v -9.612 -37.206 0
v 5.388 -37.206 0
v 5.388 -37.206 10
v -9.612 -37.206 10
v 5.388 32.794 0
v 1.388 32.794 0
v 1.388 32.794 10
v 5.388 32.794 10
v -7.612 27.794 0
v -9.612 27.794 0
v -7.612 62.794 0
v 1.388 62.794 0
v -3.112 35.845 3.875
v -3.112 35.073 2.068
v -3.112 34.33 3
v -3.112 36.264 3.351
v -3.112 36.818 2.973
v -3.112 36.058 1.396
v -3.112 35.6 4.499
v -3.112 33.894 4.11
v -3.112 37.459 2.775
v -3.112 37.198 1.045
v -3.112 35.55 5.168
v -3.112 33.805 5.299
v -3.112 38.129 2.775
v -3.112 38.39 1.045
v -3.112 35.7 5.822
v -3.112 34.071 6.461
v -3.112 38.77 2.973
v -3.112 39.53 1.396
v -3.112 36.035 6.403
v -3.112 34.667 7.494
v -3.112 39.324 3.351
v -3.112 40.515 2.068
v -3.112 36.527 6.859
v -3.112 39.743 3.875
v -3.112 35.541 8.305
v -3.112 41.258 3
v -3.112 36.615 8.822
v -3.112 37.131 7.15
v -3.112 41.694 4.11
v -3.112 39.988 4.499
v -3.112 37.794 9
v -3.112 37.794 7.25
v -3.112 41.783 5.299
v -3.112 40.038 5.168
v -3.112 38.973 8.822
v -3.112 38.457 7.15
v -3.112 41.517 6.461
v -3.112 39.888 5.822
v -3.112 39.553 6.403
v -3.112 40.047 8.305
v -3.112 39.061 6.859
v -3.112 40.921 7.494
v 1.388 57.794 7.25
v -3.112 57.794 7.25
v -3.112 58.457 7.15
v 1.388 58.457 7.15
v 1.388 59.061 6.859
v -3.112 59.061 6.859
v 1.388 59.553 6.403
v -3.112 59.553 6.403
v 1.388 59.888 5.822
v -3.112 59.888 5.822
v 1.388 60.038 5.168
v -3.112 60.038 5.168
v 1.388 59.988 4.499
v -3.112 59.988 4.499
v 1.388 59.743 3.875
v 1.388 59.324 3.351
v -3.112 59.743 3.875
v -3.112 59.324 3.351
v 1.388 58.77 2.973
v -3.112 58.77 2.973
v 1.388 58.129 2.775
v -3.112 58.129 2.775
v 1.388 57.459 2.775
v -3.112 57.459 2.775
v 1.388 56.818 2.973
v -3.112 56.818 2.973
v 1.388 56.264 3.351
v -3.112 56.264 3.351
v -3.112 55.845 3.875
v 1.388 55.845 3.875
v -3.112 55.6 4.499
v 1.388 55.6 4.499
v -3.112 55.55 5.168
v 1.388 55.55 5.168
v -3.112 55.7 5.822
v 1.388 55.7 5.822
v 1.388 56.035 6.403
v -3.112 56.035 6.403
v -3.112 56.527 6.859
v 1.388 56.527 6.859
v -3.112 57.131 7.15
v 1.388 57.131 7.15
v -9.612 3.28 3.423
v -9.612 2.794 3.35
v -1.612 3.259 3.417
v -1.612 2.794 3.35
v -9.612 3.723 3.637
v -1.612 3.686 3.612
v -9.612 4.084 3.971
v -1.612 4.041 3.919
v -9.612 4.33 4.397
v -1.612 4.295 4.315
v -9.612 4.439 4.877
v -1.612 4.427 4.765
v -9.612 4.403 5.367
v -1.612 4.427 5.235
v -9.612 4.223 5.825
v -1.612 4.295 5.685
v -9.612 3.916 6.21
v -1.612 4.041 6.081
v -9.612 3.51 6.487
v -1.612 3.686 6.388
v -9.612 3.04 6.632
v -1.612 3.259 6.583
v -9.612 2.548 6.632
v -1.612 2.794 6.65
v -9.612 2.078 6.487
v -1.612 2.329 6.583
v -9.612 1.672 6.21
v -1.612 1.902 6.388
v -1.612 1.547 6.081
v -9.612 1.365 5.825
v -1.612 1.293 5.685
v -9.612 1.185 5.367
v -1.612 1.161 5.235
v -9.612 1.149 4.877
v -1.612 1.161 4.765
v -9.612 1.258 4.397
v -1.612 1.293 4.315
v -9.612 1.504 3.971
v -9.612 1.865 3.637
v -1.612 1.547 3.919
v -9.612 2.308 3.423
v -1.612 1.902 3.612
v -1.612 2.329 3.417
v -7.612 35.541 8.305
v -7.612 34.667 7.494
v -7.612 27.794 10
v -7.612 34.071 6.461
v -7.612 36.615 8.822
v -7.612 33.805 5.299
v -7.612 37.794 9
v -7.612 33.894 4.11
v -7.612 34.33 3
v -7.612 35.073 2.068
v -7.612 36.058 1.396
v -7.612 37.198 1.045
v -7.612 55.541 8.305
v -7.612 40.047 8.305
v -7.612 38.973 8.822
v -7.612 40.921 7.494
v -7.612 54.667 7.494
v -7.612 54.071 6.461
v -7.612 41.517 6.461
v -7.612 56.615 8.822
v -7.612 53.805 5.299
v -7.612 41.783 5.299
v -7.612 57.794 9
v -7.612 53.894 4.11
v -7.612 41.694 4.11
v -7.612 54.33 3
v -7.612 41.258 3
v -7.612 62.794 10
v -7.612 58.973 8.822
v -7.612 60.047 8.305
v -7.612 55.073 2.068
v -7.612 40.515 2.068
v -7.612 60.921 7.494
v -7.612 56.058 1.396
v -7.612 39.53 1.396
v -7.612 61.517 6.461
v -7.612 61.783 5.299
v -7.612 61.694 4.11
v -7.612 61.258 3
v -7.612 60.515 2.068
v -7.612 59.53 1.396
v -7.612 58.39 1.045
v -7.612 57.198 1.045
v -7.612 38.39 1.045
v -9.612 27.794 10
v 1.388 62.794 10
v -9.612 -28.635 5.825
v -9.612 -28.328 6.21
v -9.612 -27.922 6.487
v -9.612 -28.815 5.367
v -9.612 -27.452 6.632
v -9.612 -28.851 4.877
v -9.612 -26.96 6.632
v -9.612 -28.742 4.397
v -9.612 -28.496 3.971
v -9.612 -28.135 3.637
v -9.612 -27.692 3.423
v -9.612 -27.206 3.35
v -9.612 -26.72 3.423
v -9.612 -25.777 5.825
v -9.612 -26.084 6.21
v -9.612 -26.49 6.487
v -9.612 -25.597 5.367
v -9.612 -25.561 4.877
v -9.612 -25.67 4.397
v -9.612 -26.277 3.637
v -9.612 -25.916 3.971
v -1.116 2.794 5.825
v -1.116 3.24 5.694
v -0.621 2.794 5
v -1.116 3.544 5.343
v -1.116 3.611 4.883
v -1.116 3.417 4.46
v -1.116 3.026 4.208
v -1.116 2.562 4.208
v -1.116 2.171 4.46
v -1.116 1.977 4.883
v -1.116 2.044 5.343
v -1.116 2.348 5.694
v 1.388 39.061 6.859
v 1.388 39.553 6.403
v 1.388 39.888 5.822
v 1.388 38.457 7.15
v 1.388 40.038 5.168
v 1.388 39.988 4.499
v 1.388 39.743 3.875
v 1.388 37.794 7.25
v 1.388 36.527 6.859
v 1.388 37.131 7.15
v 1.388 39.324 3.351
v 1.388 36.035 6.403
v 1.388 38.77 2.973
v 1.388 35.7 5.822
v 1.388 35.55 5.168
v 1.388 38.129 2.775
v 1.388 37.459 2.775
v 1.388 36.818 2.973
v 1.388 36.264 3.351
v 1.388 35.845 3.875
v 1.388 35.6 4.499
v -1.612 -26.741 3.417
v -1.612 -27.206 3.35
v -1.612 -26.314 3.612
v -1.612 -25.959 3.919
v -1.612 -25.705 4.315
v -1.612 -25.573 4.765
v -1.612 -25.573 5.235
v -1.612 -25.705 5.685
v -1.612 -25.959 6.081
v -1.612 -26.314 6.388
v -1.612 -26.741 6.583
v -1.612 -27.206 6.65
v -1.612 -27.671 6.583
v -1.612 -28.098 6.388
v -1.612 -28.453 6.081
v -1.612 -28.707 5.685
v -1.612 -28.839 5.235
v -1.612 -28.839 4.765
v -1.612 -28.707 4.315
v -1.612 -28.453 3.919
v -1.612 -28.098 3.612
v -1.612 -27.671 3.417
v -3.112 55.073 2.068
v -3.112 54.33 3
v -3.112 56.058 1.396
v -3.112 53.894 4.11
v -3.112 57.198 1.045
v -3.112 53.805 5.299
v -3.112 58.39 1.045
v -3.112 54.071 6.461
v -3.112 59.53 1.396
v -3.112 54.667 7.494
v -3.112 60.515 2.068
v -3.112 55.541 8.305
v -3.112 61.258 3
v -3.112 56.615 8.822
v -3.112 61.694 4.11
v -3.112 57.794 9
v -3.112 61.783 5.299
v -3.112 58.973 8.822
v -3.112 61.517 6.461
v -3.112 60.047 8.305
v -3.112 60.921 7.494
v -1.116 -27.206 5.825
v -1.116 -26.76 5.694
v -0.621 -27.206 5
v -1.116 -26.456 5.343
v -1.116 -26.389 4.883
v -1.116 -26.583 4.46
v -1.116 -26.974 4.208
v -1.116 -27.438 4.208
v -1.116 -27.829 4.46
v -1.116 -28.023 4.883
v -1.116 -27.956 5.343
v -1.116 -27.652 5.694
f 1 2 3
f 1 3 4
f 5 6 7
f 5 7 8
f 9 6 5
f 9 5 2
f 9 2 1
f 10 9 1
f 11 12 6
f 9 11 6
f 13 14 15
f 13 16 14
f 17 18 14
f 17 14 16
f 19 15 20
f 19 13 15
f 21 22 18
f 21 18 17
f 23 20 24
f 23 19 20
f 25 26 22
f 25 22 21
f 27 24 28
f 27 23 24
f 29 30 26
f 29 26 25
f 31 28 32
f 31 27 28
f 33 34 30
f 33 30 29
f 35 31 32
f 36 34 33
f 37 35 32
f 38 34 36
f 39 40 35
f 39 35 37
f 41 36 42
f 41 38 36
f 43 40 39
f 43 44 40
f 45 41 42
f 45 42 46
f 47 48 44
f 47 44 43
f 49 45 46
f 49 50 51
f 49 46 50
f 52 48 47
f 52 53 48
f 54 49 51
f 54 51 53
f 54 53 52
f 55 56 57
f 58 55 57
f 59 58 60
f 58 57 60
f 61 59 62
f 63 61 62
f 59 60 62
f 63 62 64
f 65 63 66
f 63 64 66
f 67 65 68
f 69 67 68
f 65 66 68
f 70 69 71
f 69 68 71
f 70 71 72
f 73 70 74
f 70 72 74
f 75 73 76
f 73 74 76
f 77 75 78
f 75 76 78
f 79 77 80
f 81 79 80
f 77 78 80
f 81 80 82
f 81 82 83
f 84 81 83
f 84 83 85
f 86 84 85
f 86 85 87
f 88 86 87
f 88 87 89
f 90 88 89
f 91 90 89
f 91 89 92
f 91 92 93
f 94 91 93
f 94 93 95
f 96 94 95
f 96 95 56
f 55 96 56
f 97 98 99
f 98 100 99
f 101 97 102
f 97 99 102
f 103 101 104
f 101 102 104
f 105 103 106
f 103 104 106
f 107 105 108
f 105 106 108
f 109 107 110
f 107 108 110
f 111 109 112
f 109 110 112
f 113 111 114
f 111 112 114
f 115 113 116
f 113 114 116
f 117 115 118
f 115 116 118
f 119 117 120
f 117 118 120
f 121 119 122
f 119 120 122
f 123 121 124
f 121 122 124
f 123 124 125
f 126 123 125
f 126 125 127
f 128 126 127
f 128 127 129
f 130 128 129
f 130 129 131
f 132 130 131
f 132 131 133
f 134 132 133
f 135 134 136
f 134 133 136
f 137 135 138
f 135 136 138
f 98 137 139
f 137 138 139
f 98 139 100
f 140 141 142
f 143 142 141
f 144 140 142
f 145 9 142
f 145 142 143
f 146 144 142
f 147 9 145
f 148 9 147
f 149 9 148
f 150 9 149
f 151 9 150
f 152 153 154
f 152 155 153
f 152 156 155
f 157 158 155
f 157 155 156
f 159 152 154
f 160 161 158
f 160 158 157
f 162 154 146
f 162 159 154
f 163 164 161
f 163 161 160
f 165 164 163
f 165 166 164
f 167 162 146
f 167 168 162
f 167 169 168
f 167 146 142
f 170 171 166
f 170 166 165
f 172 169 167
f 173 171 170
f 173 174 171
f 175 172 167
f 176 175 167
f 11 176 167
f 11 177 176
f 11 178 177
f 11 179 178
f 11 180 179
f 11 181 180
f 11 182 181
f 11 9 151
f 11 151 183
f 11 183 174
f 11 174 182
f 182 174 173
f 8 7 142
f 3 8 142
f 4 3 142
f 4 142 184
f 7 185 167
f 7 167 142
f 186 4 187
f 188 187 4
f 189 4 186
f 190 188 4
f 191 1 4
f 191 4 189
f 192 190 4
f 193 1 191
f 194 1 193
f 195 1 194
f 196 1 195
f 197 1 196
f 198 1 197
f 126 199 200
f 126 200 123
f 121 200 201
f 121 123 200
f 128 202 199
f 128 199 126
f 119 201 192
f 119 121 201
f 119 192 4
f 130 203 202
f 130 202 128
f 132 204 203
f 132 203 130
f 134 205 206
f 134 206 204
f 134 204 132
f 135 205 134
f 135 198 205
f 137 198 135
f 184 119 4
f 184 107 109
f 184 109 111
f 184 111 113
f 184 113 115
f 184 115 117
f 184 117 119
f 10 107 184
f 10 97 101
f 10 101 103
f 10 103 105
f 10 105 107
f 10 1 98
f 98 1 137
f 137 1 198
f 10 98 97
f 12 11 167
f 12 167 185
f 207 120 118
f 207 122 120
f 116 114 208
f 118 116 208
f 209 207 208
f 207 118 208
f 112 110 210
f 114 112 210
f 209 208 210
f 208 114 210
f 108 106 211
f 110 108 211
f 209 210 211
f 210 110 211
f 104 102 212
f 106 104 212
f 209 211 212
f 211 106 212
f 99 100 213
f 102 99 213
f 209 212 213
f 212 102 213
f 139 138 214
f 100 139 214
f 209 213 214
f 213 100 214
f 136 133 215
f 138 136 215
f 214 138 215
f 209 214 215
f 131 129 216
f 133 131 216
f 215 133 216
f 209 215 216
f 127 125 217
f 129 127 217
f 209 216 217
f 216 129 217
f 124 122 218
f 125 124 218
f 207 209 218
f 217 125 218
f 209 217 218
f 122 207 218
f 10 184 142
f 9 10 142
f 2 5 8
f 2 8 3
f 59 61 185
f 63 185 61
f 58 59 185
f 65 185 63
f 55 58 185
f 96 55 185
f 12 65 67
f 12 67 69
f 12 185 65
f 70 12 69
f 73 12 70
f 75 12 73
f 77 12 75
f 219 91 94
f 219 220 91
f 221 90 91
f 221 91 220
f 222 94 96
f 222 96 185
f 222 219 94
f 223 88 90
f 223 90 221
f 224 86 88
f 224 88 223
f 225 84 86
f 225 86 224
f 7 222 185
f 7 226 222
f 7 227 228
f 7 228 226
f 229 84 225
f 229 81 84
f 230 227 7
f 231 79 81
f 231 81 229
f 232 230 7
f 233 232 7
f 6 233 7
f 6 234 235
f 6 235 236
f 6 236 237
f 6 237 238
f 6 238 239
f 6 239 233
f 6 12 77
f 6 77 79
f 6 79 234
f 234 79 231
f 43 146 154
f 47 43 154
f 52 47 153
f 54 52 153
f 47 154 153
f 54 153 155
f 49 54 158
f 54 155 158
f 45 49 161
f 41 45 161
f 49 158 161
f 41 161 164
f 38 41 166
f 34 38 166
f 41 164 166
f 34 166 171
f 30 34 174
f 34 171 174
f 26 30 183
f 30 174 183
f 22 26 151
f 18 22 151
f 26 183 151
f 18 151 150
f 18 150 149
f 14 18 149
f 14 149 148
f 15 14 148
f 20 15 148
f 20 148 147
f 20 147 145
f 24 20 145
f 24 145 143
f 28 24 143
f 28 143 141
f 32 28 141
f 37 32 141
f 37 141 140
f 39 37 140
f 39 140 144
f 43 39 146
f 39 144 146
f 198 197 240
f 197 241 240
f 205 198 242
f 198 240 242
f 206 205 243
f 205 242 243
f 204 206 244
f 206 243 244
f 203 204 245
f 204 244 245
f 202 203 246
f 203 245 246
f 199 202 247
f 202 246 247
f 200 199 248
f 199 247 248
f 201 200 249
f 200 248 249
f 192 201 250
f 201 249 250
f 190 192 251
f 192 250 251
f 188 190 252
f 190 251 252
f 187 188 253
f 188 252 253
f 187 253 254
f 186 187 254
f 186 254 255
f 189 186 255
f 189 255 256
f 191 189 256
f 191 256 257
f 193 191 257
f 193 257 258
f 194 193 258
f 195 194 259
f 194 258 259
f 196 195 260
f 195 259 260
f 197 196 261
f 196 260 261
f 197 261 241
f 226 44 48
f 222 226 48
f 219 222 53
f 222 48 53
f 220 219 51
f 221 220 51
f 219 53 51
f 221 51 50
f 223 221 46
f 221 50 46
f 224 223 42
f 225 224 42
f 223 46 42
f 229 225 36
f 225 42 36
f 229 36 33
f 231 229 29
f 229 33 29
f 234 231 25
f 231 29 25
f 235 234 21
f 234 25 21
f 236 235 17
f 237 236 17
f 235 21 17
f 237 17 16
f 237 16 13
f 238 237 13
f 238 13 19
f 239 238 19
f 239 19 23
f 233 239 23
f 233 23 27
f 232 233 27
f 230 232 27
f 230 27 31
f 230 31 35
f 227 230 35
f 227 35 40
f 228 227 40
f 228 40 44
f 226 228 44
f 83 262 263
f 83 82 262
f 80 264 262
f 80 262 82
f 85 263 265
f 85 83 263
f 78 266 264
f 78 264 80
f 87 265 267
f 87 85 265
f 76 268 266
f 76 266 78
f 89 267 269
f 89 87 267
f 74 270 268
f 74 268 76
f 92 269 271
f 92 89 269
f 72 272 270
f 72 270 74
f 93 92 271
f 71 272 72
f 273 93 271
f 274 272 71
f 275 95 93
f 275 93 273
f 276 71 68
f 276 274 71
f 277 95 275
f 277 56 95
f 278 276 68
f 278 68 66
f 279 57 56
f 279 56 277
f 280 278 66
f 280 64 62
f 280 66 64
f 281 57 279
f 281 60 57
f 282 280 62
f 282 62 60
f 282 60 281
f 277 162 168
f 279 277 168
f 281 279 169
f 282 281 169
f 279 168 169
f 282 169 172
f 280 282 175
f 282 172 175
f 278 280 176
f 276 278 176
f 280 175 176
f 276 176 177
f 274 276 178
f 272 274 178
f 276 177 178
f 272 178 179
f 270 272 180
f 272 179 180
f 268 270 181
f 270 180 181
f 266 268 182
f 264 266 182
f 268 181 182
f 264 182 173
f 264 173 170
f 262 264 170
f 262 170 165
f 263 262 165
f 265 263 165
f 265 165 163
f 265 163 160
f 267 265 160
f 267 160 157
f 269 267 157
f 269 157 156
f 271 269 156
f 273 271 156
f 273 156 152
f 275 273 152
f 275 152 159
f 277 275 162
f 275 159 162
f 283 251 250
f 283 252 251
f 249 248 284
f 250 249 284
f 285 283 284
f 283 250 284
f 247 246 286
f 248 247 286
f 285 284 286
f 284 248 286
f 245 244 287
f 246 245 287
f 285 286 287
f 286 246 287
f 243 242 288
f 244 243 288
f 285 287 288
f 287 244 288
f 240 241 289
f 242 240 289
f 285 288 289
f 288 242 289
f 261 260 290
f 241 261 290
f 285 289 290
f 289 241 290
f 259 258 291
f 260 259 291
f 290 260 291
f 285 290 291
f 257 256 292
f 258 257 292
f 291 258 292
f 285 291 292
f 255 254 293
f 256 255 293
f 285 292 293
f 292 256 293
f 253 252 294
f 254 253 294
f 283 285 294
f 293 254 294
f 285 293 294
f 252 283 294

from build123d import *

# Parameters (mm, degrees)
BOSS_EXTRUDE1_DEPTH       = 10
SKETCH2_R                 = 4
CUT_EXTRUDE1_DEPTH        = 4.5
SKETCH3_R                 = 2.25
CUT_EXTRUDE2_DEPTH        = 9.5
M4X0_7_TAPPED_HOLE1_D     = 3.3
M4X0_7_TAPPED_HOLE1_DEPTH = 8
M4X0_7_TAPPED_HOLE1_TIP   = 0.991420021


with BuildPart() as part:
    # Sketch1 → Boss-Extrude1 (new body)
    with BuildSketch(Plane.XY):
        Polygon((-7.612, 62.794), (1.388, 62.794), (1.388, 32.794), (5.388, 32.794), (5.388, -37.206), (-9.612, -37.206), (-9.612, 27.794), (-7.612, 27.794), align=None)
    extrude(amount=BOSS_EXTRUDE1_DEPTH)

    # Sketch2 → Cut-Extrude1 (cut)
    with BuildSketch(Plane.ZY.offset(7.612)):
        with Locations((5, 57.794)):
            Circle(SKETCH2_R)
        with Locations((5, 37.794)):
            Circle(SKETCH2_R)
    extrude(amount=-CUT_EXTRUDE1_DEPTH, mode=Mode.SUBTRACT)

    # Sketch3 → Cut-Extrude2 (cut, through all)
    with BuildSketch(Plane.ZY.offset(3.112)):
        with Locations((5, 37.794)):
            Circle(SKETCH3_R)
        with Locations((5, 57.794)):
            Circle(SKETCH3_R)
    extrude(amount=-CUT_EXTRUDE2_DEPTH, mode=Mode.SUBTRACT)

    # M4x0.7 Tapped Hole1
    with Locations(Plane.ZY.offset(9.612)):
        with Locations((5, 2.794), (5, -27.206)):
            Hole(M4X0_7_TAPPED_HOLE1_D / 2, depth=M4X0_7_TAPPED_HOLE1_DEPTH)
            with Locations((0, 0, -(M4X0_7_TAPPED_HOLE1_DEPTH + M4X0_7_TAPPED_HOLE1_TIP / 2))):  # 118° drill point
                Cone(0, M4X0_7_TAPPED_HOLE1_D / 2, M4X0_7_TAPPED_HOLE1_TIP, mode=Mode.SUBTRACT)


solid = part.part
